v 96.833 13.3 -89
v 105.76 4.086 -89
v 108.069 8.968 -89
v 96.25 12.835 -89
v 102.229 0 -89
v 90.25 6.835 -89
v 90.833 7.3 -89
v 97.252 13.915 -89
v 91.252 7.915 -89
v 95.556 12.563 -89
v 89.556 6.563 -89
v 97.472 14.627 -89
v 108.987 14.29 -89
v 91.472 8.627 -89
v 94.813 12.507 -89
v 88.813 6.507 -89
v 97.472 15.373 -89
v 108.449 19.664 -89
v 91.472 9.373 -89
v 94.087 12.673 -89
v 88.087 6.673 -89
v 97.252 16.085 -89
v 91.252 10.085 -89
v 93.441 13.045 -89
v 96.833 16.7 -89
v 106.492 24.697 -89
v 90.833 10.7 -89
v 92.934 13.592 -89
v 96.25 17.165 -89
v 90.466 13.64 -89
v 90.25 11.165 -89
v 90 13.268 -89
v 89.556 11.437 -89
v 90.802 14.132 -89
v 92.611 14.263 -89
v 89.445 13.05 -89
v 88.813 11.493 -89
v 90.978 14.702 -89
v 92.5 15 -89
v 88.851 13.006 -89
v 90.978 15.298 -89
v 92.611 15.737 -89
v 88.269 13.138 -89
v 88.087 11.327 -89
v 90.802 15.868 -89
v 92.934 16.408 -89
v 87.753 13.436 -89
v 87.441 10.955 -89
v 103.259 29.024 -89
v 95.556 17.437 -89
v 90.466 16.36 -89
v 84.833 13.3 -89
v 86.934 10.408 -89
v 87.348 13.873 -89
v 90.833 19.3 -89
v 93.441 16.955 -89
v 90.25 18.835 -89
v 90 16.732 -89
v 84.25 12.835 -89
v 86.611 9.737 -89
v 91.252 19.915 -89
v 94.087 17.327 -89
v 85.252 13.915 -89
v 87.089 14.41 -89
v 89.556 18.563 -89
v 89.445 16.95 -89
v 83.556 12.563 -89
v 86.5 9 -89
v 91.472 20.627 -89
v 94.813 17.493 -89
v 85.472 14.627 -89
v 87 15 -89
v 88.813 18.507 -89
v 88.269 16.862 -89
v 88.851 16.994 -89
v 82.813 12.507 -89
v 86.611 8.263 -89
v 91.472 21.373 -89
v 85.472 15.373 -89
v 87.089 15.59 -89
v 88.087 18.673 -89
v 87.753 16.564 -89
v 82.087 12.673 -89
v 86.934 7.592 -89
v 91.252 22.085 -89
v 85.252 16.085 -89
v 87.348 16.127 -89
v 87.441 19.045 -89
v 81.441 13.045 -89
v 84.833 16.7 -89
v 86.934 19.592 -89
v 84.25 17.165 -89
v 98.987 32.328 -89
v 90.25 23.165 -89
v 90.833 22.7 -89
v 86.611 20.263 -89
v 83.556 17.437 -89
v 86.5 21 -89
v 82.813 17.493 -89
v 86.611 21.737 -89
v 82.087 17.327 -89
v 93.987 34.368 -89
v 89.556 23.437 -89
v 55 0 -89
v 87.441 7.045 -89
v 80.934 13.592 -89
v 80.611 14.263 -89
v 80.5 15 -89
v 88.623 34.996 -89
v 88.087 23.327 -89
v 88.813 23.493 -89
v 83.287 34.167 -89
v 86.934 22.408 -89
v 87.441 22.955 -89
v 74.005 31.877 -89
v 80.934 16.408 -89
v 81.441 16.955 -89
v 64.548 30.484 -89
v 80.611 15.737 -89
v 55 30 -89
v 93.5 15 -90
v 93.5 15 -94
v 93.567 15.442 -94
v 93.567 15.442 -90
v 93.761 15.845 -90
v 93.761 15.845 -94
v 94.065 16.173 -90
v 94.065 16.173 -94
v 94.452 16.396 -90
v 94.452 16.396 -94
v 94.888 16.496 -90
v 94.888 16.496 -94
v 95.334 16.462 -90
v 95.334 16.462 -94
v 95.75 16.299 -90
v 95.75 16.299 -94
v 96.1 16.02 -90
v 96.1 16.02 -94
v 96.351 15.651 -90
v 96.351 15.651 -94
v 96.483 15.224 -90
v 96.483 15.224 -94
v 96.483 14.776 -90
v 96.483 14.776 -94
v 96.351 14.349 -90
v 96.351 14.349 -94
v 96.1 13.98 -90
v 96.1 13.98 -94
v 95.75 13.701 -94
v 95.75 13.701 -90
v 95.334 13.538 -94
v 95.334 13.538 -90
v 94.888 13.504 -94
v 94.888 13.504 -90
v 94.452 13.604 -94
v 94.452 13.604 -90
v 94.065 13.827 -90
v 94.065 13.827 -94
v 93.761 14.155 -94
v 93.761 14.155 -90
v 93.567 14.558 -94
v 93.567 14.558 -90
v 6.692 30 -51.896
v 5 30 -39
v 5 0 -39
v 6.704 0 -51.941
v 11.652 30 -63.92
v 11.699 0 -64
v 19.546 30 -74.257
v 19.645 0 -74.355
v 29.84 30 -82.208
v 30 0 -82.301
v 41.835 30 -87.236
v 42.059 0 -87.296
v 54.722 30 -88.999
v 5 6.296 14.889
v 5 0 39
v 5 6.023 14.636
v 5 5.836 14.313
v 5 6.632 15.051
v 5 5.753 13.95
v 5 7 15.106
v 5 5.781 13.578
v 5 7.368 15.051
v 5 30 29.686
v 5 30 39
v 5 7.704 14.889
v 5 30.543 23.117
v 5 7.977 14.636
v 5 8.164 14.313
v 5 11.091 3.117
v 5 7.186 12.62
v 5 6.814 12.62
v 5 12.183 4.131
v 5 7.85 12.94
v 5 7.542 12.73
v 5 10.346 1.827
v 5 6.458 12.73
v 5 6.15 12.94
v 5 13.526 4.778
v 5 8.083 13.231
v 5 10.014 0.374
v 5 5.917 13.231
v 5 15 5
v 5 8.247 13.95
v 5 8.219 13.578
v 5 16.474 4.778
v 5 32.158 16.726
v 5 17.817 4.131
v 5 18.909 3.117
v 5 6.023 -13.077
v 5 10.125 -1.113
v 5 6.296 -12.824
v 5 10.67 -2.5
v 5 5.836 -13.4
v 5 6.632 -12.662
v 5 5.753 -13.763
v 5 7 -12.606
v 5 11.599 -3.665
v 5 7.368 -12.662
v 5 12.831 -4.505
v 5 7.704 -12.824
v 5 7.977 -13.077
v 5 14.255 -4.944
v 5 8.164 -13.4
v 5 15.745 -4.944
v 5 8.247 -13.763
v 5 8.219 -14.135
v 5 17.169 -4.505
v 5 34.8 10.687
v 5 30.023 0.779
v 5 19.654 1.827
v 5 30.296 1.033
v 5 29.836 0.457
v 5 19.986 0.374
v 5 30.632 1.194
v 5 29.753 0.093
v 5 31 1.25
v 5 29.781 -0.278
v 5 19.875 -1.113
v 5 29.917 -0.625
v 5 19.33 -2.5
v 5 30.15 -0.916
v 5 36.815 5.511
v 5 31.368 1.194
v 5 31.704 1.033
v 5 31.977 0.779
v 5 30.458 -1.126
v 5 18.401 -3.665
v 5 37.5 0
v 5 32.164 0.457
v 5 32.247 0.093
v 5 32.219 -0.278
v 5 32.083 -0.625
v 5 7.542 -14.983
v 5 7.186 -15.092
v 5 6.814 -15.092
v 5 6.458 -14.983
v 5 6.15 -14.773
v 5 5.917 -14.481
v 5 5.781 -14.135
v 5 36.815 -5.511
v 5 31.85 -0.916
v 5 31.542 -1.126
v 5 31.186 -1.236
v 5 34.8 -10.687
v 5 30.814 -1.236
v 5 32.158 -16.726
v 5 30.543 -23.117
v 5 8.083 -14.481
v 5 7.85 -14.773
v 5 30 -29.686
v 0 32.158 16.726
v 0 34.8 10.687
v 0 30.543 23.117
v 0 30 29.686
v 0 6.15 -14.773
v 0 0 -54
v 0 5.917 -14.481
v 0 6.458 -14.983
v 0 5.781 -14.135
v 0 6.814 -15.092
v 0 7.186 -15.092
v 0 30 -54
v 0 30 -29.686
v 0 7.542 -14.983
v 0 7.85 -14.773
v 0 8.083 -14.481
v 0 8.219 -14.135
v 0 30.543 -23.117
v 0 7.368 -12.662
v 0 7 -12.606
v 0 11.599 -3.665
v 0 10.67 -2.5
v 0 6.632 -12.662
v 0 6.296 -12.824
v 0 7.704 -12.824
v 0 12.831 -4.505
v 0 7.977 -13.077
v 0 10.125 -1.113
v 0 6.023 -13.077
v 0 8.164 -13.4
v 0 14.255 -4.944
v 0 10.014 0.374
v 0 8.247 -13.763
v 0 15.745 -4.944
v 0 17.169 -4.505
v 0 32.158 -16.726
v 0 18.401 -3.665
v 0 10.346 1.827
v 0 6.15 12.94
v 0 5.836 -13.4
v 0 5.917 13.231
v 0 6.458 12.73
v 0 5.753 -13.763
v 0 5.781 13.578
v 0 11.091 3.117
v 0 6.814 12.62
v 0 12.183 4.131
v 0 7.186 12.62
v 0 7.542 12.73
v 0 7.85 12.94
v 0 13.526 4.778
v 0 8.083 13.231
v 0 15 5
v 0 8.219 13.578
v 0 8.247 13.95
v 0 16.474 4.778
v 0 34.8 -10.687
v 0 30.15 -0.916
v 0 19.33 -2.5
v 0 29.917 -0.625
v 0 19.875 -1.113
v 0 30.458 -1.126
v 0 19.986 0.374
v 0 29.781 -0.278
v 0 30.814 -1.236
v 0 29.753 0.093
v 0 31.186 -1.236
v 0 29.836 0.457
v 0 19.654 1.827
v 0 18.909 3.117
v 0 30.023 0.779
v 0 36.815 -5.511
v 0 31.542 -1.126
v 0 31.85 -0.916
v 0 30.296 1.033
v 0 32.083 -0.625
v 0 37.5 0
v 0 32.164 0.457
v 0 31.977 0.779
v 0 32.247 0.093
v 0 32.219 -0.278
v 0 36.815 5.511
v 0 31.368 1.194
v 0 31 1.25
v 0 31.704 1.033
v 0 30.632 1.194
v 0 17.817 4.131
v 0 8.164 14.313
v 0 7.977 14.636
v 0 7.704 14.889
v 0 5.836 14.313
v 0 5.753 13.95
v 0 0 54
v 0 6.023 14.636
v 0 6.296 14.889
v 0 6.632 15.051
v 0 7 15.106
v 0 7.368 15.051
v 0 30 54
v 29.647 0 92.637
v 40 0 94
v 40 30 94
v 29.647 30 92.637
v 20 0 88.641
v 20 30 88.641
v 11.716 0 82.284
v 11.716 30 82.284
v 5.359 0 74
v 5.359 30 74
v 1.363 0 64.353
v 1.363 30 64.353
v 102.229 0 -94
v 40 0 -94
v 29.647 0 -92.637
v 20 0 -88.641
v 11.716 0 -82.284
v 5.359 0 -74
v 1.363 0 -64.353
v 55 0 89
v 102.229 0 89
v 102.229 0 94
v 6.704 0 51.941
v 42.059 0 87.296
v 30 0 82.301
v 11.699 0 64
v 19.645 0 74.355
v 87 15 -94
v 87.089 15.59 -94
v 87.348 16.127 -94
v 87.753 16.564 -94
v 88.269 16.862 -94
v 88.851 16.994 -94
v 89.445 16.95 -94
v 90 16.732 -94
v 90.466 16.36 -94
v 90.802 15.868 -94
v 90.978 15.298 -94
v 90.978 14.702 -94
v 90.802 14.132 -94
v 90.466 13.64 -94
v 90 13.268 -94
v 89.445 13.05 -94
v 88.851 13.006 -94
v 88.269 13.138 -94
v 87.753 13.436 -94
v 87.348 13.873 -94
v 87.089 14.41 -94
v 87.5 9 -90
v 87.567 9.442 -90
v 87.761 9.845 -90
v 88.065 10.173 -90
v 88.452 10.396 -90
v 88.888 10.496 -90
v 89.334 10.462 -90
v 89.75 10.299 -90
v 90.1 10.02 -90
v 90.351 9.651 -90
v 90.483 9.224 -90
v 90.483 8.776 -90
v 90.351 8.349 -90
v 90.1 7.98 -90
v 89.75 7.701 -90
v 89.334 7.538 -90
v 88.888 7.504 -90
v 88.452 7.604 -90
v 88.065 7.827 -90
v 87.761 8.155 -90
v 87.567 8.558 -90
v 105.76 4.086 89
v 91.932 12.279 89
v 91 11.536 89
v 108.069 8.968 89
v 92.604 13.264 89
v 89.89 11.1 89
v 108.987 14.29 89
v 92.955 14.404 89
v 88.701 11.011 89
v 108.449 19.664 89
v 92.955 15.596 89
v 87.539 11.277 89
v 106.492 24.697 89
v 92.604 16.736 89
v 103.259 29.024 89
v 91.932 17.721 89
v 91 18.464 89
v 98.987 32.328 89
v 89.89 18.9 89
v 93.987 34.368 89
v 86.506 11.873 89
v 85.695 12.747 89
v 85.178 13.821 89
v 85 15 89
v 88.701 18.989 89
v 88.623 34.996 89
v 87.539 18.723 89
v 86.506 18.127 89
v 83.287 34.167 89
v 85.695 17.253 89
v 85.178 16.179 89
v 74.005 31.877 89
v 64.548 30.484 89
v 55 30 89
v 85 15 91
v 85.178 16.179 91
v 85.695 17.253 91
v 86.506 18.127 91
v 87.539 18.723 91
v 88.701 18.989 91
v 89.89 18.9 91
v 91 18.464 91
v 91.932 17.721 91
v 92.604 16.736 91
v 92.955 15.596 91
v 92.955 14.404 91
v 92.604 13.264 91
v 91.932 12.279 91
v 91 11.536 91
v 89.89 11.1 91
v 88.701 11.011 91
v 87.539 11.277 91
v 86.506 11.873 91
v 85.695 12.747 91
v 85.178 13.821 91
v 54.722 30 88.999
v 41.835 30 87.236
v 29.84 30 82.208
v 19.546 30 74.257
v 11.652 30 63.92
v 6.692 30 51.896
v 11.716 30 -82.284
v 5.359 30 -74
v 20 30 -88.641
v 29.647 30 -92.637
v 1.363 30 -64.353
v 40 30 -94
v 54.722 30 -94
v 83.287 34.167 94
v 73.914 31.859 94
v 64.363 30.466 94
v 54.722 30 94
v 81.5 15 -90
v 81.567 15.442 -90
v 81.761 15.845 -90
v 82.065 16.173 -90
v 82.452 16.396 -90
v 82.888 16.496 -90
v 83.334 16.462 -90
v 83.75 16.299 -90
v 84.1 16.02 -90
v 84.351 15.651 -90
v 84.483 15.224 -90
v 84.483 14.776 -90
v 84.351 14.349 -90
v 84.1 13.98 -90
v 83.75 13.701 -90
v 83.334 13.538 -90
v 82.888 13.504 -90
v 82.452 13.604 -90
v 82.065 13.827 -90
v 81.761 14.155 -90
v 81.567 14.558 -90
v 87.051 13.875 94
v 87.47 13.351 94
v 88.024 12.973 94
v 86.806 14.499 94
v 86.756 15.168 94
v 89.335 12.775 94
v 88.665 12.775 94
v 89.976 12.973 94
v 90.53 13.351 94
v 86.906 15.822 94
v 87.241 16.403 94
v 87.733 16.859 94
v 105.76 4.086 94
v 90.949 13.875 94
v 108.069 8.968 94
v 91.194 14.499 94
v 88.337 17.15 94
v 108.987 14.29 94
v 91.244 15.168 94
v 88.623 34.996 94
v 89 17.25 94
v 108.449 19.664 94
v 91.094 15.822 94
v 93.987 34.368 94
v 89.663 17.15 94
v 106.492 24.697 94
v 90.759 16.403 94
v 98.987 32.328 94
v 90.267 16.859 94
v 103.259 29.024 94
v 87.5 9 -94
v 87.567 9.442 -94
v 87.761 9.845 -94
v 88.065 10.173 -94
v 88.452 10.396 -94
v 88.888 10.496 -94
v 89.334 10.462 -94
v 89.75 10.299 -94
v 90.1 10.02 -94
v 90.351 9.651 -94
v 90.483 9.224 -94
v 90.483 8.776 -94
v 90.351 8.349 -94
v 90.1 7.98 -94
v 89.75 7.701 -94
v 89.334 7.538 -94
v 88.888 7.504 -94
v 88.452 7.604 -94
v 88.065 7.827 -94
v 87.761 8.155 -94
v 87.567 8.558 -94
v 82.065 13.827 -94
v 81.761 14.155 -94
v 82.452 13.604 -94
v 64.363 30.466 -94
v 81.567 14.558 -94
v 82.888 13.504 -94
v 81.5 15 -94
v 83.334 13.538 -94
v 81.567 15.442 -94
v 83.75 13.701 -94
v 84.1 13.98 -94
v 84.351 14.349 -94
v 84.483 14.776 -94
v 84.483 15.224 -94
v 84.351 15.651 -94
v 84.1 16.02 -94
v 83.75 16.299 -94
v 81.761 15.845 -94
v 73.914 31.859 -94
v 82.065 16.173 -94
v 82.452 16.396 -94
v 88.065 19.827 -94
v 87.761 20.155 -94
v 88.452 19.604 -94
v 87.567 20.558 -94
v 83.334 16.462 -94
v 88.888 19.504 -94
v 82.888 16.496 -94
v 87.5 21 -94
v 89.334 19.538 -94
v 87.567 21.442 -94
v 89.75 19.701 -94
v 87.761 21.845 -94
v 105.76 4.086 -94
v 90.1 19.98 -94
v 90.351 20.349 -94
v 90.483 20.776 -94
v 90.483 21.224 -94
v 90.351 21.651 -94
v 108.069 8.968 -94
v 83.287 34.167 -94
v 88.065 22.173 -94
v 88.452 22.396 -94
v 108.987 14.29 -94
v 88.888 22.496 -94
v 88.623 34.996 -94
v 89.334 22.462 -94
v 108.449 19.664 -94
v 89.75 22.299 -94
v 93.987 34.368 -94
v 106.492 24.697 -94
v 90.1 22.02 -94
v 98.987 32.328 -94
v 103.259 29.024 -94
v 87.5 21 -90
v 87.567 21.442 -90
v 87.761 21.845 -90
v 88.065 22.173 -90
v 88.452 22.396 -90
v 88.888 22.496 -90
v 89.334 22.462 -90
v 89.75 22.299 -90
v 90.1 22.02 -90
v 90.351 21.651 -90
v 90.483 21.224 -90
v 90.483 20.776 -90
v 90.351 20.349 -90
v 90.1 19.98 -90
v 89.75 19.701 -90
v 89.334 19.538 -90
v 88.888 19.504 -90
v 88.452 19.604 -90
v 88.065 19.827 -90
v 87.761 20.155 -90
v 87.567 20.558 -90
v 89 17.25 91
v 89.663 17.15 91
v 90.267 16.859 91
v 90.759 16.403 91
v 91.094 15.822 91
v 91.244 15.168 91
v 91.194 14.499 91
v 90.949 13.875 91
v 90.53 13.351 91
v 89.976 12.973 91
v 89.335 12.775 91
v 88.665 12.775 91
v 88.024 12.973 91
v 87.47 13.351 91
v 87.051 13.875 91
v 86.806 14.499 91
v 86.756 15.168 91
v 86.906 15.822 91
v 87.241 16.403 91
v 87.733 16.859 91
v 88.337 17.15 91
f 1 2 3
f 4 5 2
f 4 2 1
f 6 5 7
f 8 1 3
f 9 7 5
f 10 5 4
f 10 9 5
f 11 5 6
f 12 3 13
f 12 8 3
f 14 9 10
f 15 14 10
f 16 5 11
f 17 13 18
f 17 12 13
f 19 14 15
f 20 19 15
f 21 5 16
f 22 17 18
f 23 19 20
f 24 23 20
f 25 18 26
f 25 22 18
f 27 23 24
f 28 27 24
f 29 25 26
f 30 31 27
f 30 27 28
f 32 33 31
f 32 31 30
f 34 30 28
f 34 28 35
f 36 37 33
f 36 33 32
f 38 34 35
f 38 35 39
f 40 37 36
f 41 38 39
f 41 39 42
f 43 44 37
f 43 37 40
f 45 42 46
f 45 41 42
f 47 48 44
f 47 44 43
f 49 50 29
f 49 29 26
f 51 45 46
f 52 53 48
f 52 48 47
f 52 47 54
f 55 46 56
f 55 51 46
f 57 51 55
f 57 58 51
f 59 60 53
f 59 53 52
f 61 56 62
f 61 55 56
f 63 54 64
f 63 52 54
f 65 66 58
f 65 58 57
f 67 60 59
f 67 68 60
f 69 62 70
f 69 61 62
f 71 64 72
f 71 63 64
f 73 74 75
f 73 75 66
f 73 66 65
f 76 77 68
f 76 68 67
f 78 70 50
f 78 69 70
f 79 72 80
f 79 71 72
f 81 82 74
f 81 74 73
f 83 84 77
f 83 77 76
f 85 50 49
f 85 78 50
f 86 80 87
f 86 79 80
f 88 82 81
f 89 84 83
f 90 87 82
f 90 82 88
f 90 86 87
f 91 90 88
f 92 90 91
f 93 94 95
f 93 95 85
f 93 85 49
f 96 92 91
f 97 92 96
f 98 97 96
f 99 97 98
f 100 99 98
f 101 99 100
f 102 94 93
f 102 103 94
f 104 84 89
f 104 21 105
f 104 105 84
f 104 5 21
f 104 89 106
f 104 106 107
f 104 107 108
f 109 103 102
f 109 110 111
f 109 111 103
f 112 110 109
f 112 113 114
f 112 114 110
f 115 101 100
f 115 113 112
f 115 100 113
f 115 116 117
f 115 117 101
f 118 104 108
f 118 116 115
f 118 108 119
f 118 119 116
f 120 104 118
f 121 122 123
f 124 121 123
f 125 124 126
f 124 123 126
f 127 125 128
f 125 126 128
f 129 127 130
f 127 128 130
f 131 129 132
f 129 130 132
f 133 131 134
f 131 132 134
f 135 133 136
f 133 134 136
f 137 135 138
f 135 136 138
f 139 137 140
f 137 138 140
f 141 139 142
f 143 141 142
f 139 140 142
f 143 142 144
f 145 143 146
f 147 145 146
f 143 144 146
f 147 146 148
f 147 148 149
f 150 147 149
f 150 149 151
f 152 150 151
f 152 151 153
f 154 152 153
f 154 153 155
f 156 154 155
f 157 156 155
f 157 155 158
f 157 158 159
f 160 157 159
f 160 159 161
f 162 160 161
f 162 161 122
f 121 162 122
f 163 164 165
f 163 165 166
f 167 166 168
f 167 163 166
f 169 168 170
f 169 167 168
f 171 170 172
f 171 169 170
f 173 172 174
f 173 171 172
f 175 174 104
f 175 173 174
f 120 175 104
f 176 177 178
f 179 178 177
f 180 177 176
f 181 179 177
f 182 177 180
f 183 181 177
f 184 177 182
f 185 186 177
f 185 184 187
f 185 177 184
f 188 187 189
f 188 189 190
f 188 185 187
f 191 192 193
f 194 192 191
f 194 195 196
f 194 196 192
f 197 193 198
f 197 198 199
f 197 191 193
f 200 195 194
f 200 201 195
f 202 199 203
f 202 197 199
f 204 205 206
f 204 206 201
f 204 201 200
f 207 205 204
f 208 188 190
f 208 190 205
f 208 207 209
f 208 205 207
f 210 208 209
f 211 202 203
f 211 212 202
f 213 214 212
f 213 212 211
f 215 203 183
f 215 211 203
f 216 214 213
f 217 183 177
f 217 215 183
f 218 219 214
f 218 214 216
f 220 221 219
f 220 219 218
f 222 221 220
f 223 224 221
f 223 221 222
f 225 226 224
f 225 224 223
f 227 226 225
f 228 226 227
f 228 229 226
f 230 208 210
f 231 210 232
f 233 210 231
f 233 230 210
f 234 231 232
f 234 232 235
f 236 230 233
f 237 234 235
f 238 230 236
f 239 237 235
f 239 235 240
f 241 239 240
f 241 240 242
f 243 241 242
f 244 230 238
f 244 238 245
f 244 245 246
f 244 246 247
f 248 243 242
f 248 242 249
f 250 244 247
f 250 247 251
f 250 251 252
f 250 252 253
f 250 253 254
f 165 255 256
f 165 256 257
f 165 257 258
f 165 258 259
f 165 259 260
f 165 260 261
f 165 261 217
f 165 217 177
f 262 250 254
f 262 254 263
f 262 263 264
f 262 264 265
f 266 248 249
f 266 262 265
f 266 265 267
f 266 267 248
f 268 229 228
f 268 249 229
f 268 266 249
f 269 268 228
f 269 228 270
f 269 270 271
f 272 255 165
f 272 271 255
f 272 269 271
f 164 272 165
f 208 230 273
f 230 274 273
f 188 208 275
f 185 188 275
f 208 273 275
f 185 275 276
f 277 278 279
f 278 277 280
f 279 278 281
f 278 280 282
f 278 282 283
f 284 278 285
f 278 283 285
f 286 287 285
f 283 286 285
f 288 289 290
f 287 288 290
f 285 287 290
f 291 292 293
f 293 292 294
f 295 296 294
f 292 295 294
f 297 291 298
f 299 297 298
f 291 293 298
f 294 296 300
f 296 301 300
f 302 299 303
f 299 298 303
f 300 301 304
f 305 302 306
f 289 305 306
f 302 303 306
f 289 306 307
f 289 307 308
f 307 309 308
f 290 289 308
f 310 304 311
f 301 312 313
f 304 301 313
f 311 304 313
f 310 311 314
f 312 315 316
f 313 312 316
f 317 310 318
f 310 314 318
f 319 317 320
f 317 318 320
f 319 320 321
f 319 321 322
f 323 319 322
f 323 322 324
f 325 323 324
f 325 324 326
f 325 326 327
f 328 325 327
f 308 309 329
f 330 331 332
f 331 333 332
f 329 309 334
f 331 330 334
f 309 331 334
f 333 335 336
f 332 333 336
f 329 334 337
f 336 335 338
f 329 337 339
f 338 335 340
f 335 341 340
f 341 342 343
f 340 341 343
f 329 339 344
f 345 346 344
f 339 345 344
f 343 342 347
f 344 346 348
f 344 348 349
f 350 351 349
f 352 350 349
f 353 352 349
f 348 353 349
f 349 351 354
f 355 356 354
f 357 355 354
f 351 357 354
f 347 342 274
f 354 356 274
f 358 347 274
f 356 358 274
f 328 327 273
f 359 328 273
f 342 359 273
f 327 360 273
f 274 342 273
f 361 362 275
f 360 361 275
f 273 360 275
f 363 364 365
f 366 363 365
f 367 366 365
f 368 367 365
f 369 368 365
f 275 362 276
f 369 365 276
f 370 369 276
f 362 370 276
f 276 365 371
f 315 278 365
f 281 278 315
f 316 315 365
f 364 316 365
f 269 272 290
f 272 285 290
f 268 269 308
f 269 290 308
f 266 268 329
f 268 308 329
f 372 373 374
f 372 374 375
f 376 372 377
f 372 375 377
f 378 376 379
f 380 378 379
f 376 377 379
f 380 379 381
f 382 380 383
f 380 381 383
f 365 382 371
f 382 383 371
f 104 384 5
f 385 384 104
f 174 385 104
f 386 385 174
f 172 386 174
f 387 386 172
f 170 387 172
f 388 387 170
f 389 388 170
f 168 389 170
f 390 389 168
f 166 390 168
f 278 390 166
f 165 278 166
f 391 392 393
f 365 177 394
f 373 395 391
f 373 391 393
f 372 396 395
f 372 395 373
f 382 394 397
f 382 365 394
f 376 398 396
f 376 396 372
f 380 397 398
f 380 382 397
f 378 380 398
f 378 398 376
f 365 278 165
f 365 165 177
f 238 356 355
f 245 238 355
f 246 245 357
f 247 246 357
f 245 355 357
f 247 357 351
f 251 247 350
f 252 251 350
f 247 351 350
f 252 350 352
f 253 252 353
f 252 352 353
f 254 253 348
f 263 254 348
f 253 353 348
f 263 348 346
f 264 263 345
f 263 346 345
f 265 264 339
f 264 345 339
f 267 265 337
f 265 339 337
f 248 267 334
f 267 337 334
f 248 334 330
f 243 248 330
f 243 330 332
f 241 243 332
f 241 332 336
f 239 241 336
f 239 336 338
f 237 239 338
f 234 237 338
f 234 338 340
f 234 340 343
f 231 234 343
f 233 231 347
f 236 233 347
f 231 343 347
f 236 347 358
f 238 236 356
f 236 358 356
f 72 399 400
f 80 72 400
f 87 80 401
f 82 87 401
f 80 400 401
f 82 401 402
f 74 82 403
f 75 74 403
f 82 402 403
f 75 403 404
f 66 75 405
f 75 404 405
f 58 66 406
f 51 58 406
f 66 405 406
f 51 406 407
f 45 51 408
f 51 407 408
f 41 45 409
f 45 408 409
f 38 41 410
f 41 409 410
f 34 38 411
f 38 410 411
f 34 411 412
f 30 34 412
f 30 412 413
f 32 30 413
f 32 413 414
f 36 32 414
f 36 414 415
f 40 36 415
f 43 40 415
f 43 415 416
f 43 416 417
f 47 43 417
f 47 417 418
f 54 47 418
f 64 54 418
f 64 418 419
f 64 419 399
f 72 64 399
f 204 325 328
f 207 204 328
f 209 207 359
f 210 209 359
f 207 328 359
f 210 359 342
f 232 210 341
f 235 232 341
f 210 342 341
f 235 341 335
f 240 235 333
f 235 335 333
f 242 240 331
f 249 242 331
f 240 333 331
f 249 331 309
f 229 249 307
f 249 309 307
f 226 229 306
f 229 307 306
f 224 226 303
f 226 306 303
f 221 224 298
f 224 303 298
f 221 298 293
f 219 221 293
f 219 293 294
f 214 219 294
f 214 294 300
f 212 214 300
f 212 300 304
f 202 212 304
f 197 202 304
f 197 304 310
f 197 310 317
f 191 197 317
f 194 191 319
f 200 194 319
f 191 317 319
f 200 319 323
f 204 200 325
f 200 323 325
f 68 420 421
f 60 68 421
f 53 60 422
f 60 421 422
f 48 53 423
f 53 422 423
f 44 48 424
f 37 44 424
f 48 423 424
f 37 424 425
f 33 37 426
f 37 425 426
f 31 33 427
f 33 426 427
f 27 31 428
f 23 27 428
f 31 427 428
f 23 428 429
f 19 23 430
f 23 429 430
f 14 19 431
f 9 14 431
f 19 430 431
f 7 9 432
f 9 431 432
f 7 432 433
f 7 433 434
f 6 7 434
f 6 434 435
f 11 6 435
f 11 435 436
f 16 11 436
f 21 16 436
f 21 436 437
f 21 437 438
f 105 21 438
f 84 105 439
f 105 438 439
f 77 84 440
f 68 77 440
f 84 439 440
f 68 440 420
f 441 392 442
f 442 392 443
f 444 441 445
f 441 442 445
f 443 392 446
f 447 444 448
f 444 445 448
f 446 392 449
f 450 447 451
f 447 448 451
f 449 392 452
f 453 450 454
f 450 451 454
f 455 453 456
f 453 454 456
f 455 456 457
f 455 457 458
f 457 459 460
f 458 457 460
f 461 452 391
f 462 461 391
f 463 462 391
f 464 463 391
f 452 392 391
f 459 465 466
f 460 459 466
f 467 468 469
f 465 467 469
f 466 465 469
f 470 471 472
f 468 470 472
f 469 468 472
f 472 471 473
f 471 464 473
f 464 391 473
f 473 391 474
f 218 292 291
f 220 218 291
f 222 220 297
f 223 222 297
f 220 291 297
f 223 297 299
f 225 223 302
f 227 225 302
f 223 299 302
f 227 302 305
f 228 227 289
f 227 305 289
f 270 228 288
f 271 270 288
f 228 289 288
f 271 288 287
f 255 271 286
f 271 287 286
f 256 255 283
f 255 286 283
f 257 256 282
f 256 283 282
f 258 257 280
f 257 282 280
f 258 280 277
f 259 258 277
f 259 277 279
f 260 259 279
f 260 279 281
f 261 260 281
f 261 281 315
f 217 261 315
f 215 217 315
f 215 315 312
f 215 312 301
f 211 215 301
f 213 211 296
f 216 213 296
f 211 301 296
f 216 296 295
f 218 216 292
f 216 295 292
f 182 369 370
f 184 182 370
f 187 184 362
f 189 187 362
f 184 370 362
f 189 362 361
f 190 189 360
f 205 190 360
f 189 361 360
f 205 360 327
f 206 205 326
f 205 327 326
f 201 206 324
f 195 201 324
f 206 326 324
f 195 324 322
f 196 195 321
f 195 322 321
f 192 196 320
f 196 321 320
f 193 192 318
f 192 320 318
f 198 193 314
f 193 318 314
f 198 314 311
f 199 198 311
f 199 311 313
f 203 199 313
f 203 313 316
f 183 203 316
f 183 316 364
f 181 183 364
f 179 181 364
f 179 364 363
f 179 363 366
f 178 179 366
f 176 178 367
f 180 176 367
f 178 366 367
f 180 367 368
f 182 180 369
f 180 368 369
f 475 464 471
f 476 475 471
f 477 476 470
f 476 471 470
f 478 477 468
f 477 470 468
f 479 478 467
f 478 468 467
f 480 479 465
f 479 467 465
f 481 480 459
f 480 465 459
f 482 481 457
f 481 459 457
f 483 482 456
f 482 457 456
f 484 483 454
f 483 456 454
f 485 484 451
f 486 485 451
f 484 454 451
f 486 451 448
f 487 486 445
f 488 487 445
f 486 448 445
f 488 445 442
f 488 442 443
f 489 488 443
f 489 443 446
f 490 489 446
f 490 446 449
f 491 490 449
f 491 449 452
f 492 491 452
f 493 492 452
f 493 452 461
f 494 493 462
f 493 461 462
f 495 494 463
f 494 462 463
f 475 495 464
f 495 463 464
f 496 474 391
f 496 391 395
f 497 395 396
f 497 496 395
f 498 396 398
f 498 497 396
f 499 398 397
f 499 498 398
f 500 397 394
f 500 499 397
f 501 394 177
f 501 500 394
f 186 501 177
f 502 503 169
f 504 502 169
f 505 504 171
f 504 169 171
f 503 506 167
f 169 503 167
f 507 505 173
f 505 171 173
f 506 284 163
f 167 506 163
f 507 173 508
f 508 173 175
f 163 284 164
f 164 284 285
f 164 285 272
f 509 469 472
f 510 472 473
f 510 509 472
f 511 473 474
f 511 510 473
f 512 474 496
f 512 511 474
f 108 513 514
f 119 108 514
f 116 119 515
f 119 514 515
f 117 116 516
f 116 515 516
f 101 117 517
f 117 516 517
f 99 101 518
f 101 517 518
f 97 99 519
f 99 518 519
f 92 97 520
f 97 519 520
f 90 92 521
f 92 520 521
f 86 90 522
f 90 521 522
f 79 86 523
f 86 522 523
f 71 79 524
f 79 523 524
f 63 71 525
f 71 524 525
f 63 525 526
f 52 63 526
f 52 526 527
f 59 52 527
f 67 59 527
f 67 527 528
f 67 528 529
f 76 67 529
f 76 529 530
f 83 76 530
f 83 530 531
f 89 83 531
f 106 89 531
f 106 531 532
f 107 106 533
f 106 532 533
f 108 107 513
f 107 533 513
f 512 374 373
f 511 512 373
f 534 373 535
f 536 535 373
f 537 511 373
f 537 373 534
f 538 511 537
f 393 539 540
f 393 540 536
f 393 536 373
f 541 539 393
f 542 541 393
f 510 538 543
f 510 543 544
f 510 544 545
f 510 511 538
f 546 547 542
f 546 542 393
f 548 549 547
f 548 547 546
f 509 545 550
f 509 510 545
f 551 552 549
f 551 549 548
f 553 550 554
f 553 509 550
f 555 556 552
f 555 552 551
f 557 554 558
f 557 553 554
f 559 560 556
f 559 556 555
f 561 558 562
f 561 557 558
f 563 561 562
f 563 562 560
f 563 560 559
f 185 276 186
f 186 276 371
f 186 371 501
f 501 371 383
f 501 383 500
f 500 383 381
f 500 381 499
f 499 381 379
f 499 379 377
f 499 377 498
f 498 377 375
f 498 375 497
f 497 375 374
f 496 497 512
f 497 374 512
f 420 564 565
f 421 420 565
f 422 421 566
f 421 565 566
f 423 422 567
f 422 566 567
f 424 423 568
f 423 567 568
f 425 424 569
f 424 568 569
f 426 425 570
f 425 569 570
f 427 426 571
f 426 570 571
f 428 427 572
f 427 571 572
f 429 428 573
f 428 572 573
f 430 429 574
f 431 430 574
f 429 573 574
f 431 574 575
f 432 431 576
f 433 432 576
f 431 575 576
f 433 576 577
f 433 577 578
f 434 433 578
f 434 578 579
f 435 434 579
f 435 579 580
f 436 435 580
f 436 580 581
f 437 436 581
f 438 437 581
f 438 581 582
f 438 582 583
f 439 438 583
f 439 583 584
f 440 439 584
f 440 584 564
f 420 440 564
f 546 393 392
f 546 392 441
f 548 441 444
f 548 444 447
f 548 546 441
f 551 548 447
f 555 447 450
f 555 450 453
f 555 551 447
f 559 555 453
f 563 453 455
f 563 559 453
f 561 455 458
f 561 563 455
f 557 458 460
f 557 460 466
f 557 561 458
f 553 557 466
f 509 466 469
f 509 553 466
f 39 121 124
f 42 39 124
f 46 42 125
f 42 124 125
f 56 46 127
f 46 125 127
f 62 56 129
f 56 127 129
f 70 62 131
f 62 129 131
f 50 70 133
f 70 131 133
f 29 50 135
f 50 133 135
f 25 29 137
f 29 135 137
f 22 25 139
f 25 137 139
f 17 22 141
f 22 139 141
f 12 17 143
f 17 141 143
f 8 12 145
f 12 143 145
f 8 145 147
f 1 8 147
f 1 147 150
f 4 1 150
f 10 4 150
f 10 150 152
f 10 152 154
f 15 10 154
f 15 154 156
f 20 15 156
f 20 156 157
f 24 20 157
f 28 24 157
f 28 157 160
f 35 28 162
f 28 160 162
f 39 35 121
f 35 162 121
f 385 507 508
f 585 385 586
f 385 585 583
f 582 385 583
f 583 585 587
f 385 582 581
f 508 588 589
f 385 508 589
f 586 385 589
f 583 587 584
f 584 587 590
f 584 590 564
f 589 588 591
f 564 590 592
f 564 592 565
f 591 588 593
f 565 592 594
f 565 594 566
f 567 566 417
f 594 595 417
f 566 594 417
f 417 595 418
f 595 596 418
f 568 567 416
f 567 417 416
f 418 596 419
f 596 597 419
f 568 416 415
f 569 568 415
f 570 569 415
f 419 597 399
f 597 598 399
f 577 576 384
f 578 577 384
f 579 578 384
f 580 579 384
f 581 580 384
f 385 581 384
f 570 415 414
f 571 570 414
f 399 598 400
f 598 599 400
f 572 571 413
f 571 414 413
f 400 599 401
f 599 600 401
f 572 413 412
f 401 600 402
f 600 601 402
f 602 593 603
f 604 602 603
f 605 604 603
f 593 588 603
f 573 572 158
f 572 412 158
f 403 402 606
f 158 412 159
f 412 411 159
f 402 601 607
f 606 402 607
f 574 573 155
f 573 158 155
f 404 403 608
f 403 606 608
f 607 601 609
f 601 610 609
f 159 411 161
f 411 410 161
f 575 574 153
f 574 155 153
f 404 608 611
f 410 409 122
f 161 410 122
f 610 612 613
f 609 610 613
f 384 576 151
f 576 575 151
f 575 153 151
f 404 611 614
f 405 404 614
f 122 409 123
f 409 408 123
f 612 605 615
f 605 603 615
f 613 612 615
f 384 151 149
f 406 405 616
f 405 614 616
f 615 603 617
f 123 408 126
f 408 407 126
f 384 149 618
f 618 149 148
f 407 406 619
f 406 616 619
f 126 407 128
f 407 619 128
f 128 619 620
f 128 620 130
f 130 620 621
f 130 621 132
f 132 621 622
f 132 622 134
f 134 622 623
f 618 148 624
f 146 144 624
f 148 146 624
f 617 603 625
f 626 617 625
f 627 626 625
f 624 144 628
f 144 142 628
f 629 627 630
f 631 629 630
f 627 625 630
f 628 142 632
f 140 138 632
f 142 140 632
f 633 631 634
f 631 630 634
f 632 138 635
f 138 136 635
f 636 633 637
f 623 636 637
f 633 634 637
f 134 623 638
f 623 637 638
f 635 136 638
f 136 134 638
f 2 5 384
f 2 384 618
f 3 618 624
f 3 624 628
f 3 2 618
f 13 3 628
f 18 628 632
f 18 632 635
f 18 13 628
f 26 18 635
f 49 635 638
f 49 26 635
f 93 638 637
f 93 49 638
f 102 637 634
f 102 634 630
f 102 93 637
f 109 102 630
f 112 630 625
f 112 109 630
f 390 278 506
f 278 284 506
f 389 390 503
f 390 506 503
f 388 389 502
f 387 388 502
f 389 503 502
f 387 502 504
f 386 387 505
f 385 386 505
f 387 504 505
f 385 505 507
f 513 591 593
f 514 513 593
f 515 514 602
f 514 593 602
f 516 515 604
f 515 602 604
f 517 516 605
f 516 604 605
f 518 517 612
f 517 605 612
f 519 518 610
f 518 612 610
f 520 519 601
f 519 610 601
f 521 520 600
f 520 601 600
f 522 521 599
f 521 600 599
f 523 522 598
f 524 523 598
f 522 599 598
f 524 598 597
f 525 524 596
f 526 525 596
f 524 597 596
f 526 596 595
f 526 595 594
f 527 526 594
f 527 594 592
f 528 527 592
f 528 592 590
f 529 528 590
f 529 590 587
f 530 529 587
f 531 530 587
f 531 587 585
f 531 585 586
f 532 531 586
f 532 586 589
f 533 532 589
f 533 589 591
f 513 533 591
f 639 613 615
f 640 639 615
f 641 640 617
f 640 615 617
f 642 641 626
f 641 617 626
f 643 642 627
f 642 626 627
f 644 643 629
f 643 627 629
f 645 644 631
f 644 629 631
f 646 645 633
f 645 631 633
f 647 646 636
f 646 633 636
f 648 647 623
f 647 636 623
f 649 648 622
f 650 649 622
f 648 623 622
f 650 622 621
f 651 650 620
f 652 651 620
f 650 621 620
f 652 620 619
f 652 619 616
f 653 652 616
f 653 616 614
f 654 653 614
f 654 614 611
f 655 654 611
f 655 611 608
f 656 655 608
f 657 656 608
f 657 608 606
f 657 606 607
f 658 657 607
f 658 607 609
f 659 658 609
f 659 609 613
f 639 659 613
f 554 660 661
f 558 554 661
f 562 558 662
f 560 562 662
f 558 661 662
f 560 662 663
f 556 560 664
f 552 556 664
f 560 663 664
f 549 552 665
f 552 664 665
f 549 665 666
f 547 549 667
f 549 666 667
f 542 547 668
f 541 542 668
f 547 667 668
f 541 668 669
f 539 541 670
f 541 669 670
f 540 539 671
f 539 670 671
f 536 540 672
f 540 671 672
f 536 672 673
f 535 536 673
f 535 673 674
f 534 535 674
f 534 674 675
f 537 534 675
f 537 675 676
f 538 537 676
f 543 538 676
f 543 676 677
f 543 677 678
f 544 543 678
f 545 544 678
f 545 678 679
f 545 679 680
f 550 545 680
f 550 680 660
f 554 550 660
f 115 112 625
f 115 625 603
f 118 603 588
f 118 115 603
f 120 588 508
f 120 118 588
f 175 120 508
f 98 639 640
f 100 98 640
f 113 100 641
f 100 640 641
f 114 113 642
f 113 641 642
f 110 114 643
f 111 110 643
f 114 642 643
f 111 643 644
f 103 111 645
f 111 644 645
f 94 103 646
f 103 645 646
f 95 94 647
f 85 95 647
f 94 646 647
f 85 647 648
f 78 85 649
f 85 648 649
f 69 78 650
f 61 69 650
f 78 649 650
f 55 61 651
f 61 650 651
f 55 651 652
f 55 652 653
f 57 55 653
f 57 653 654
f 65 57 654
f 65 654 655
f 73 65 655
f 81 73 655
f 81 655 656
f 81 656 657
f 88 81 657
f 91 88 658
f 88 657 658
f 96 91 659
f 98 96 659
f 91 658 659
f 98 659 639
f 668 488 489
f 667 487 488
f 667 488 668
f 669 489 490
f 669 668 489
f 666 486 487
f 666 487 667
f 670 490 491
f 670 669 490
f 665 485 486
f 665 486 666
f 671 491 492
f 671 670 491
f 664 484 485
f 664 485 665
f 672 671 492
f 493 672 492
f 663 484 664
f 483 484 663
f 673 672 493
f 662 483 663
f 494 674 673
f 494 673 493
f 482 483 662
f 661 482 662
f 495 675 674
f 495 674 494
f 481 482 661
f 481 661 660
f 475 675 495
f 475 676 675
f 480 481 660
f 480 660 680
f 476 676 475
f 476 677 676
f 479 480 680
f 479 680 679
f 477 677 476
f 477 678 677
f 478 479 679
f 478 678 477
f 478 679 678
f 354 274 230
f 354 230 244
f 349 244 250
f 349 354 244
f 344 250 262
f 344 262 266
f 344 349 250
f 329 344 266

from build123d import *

# Parameters (mm, degrees)
SKETCH1_W           = 89
SKETCH1_H           = 30
BOSS_EXTRUDE1_DEPTH = 94
BOSS_EXTRUDE2_DEPTH = 94
CUT_EXTRUDE2_START  = 5
SKETCH4_W           = 178
SKETCH4_H           = 59.703545047
CUT_EXTRUDE2_DEPTH  = 150
SKETCH5_R           = 2
SKETCH5_R_2         = 1.5
CUT_EXTRUDE3_DEPTH  = 10
FILLET1_R           = 100
FILLET2_R           = 50
FILLET3_R           = 40
BOSS_EXTRUDE3_DEPTH = 5
SKETCH8_R           = 2.25
CUT_EXTRUDE5_DEPTH  = 5
FILLET4_R           = 40
SKETCH10_R          = 1.25
SKETCH10_R_2        = 5
CUT_EXTRUDE6_DEPTH  = 5
CHAMFER1_SIZE       = 1
SKETCH11_R          = 4
CUT_EXTRUDE7_DEPTH  = 2


with BuildPart() as part:
    # Sketch1 → Boss-Extrude1 (new, symmetric)
    with BuildSketch(Plane.XY):
        with Locations((44.5, 15)):
            Rectangle(SKETCH1_W, SKETCH1_H)
    extrude(amount=BOSS_EXTRUDE1_DEPTH, both=True)

    # Sketch2 → Boss-Extrude2 (add, symmetric)
    with BuildSketch(Plane.XY):
        with BuildLine():
            Line((75.771243445, 0), (102.228756555, 0))
            ThreePointArc((102.228756555, 0), (89, 35), (75.771243445, 0))
        make_face()
    extrude(amount=BOSS_EXTRUDE2_DEPTH, both=True)

    # Sketch4 → Cut-Extrude2 (cut)
    with BuildSketch(Plane(origin=(0, 0, 0), x_dir=(0, 0, -1), z_dir=(1, 0, 0)).offset(CUT_EXTRUDE2_START)):
        with Locations((0, 25.910589708)):
            Rectangle(SKETCH4_W, SKETCH4_H)
    extrude(amount=CUT_EXTRUDE2_DEPTH, mode=Mode.SUBTRACT)

    # Sketch5 → Cut-Extrude3 (cut)
    with BuildSketch(Plane(origin=(0, 0, -94), x_dir=(-1, 0, 0), z_dir=(0, 0, -1))):
        with Locations((-89, 15)):
            Circle(SKETCH5_R)
        with Locations((-95, 15)):
            Circle(SKETCH5_R_2)
        with Locations((-89, 21)):
            Circle(SKETCH5_R_2)
        with Locations((-83, 15)):
            Circle(SKETCH5_R_2)
        with Locations((-89, 9)):
            Circle(SKETCH5_R_2)
    extrude(amount=-CUT_EXTRUDE3_DEPTH, mode=Mode.SUBTRACT)

    # Fillet1
    fillet1_edges = [part.edges().sort_by_distance(p)[0] for p in [
        (75.771243445, 30, -91.5),
        (75.771243445, 30, 91.5),
    ]]
    fillet(fillet1_edges, radius=FILLET1_R)

    # Fillet2
    fillet2_edges = [part.edges().sort_by_distance(p)[0] for p in [
        (5, 15, -89),
        (5, 15, 89),
    ]]
    fillet(fillet2_edges, radius=FILLET2_R)

    # Fillet3
    fillet3_edges = [part.edges().sort_by_distance(p)[0] for p in [
        (0, 15, 94),
        (0, 15, -94),
    ]]
    fillet(fillet3_edges, radius=FILLET3_R)

    # Sketch7 → Boss-Extrude3 (add)
    with BuildSketch(Plane.ZY):
        with BuildLine():
            Line((-16.770509831, 0), (16.770509831, 0))
            ThreePointArc((16.770509831, 0), (0, 37.5), (-16.770509831, 0))
        make_face()
    extrude(amount=-BOSS_EXTRUDE3_DEPTH)

    # Sketch8 → Cut-Extrude5 (cut)
    with BuildSketch(Plane(origin=(0, 0, 89), x_dir=(-1, 0, 0), z_dir=(0, 0, -1))):
        with Locations(Location((-89, 15, 0), (0, 0, 90))):
            Circle(SKETCH8_R)
    extrude(amount=-CUT_EXTRUDE5_DEPTH, mode=Mode.SUBTRACT)

    # Fillet4
    fillet4_edges = [part.edges().sort_by_distance(p)[0] for p in [
        (2.5, 30, 16.770509831),
        (2.5, 30, -16.770509831),
    ]]
    fillet(fillet4_edges, radius=FILLET4_R)

    # Sketch10 → Cut-Extrude6 (cut)
    with BuildSketch(Plane.ZY):
        with Locations((-13.856406461, 7)):
            Circle(SKETCH10_R)
        with Locations((0, 31)):
            Circle(SKETCH10_R)
        with Locations((13.856406461, 7)):
            Circle(SKETCH10_R)
        with Locations((0, 15)):
            Circle(SKETCH10_R_2)
    extrude(amount=-CUT_EXTRUDE6_DEPTH, mode=Mode.SUBTRACT)

    # Chamfer1
    chamfer1_edges = [part.edges().sort_by_distance(p)[0] for p in [
        (96.5, 15, -89),
        (90.5, 21, -89),
        (84.5, 15, -89),
        (90.5, 9, -89),
    ]]
    chamfer(chamfer1_edges, length=CHAMFER1_SIZE)

    # Sketch11 → Cut-Extrude7 (cut)
    with BuildSketch(Plane(origin=(0, 0, 89), x_dir=(-1, 0, 0), z_dir=(0, 0, -1))):
        with Locations((-89, 15)):
            Circle(SKETCH11_R)
    extrude(amount=-CUT_EXTRUDE7_DEPTH, mode=Mode.SUBTRACT)


solid = part.part
